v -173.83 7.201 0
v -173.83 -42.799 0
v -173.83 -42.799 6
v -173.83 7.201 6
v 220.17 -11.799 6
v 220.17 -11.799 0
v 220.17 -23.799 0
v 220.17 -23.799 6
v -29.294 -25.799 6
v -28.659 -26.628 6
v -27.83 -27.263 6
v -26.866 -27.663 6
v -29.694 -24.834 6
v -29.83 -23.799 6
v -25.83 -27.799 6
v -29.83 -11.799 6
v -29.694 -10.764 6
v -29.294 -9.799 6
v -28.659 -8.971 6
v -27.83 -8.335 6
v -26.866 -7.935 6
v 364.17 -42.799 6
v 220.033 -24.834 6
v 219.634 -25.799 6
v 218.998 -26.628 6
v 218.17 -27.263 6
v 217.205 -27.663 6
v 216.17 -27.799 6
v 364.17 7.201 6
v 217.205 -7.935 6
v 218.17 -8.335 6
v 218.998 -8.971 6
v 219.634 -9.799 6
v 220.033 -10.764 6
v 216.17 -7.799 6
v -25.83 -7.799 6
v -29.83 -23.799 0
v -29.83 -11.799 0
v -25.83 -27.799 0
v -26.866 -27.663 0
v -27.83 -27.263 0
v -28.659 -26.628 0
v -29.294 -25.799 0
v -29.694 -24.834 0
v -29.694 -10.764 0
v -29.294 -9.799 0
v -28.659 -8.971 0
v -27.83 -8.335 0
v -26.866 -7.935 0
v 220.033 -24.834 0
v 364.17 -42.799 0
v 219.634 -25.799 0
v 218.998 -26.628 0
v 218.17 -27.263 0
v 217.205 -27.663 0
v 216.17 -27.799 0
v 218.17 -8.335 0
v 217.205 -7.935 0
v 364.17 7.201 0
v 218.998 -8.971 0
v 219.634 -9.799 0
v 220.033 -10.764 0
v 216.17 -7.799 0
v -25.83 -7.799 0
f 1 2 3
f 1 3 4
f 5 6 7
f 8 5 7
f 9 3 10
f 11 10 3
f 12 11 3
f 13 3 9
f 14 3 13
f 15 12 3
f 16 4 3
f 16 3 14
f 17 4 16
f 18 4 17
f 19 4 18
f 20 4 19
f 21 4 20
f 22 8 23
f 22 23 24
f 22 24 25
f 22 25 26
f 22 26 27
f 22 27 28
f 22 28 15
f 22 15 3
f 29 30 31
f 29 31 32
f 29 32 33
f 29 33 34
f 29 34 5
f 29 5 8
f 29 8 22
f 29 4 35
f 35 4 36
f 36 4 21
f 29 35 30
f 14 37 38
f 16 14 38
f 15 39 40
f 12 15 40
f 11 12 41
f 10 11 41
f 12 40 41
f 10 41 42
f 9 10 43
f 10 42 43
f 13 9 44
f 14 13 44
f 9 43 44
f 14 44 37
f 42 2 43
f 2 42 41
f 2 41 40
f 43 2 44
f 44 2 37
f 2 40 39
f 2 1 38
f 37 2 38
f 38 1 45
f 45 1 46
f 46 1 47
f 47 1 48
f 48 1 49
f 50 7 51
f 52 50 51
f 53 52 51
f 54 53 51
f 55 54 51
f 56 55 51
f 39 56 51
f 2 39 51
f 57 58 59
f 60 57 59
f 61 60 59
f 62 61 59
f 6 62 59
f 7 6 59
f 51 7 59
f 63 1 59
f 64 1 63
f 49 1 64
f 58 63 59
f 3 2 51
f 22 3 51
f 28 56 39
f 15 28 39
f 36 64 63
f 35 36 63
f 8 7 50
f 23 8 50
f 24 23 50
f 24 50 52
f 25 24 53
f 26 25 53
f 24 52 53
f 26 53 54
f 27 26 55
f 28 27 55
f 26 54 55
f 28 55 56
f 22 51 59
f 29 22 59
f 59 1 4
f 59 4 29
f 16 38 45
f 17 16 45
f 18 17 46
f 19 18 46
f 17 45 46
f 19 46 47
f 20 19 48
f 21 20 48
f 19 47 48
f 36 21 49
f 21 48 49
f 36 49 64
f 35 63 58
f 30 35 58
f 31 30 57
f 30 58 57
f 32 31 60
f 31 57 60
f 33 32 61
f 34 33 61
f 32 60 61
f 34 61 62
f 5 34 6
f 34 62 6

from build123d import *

# Parameters (mm, degrees)
SKETCH_1_W      = 538
SKETCH_1_H      = 50
EXTRUDE_1_DEPTH = 6


with BuildPart() as part:
    # Эскиз1 → Бобышка-Вытянуть1 (new body)
    with BuildSketch(Plane.XY):
        with Locations((95.16967509, -17.799165817)):
            Rectangle(SKETCH_1_W, SKETCH_1_H)
        with BuildLine():
            Line((-25.83032491, -7.799165817), (216.16967509, -7.799165817))
            ThreePointArc((216.16967509, -7.799165817), (218.998102215, -8.970738692), (220.16967509, -11.799165817))
            Line((220.16967509, -11.799165817), (220.16967509, -23.799165817))
            ThreePointArc((220.16967509, -23.799165817), (218.998102215, -26.627592942), (216.16967509, -27.799165817))
            Line((216.16967509, -27.799165817), (-25.83032491, -27.799165817))
            ThreePointArc((-25.83032491, -27.799165817), (-28.658752034, -26.627592942), (-29.83032491, -23.799165817))
            Line((-29.83032491, -23.799165817), (-29.83032491, -11.799165817))
            ThreePointArc((-29.83032491, -11.799165817), (-28.658752034, -8.970738692), (-25.83032491, -7.799165817))
        make_face(mode=Mode.SUBTRACT)
    extrude(amount=EXTRUDE_1_DEPTH)


solid = part.part
